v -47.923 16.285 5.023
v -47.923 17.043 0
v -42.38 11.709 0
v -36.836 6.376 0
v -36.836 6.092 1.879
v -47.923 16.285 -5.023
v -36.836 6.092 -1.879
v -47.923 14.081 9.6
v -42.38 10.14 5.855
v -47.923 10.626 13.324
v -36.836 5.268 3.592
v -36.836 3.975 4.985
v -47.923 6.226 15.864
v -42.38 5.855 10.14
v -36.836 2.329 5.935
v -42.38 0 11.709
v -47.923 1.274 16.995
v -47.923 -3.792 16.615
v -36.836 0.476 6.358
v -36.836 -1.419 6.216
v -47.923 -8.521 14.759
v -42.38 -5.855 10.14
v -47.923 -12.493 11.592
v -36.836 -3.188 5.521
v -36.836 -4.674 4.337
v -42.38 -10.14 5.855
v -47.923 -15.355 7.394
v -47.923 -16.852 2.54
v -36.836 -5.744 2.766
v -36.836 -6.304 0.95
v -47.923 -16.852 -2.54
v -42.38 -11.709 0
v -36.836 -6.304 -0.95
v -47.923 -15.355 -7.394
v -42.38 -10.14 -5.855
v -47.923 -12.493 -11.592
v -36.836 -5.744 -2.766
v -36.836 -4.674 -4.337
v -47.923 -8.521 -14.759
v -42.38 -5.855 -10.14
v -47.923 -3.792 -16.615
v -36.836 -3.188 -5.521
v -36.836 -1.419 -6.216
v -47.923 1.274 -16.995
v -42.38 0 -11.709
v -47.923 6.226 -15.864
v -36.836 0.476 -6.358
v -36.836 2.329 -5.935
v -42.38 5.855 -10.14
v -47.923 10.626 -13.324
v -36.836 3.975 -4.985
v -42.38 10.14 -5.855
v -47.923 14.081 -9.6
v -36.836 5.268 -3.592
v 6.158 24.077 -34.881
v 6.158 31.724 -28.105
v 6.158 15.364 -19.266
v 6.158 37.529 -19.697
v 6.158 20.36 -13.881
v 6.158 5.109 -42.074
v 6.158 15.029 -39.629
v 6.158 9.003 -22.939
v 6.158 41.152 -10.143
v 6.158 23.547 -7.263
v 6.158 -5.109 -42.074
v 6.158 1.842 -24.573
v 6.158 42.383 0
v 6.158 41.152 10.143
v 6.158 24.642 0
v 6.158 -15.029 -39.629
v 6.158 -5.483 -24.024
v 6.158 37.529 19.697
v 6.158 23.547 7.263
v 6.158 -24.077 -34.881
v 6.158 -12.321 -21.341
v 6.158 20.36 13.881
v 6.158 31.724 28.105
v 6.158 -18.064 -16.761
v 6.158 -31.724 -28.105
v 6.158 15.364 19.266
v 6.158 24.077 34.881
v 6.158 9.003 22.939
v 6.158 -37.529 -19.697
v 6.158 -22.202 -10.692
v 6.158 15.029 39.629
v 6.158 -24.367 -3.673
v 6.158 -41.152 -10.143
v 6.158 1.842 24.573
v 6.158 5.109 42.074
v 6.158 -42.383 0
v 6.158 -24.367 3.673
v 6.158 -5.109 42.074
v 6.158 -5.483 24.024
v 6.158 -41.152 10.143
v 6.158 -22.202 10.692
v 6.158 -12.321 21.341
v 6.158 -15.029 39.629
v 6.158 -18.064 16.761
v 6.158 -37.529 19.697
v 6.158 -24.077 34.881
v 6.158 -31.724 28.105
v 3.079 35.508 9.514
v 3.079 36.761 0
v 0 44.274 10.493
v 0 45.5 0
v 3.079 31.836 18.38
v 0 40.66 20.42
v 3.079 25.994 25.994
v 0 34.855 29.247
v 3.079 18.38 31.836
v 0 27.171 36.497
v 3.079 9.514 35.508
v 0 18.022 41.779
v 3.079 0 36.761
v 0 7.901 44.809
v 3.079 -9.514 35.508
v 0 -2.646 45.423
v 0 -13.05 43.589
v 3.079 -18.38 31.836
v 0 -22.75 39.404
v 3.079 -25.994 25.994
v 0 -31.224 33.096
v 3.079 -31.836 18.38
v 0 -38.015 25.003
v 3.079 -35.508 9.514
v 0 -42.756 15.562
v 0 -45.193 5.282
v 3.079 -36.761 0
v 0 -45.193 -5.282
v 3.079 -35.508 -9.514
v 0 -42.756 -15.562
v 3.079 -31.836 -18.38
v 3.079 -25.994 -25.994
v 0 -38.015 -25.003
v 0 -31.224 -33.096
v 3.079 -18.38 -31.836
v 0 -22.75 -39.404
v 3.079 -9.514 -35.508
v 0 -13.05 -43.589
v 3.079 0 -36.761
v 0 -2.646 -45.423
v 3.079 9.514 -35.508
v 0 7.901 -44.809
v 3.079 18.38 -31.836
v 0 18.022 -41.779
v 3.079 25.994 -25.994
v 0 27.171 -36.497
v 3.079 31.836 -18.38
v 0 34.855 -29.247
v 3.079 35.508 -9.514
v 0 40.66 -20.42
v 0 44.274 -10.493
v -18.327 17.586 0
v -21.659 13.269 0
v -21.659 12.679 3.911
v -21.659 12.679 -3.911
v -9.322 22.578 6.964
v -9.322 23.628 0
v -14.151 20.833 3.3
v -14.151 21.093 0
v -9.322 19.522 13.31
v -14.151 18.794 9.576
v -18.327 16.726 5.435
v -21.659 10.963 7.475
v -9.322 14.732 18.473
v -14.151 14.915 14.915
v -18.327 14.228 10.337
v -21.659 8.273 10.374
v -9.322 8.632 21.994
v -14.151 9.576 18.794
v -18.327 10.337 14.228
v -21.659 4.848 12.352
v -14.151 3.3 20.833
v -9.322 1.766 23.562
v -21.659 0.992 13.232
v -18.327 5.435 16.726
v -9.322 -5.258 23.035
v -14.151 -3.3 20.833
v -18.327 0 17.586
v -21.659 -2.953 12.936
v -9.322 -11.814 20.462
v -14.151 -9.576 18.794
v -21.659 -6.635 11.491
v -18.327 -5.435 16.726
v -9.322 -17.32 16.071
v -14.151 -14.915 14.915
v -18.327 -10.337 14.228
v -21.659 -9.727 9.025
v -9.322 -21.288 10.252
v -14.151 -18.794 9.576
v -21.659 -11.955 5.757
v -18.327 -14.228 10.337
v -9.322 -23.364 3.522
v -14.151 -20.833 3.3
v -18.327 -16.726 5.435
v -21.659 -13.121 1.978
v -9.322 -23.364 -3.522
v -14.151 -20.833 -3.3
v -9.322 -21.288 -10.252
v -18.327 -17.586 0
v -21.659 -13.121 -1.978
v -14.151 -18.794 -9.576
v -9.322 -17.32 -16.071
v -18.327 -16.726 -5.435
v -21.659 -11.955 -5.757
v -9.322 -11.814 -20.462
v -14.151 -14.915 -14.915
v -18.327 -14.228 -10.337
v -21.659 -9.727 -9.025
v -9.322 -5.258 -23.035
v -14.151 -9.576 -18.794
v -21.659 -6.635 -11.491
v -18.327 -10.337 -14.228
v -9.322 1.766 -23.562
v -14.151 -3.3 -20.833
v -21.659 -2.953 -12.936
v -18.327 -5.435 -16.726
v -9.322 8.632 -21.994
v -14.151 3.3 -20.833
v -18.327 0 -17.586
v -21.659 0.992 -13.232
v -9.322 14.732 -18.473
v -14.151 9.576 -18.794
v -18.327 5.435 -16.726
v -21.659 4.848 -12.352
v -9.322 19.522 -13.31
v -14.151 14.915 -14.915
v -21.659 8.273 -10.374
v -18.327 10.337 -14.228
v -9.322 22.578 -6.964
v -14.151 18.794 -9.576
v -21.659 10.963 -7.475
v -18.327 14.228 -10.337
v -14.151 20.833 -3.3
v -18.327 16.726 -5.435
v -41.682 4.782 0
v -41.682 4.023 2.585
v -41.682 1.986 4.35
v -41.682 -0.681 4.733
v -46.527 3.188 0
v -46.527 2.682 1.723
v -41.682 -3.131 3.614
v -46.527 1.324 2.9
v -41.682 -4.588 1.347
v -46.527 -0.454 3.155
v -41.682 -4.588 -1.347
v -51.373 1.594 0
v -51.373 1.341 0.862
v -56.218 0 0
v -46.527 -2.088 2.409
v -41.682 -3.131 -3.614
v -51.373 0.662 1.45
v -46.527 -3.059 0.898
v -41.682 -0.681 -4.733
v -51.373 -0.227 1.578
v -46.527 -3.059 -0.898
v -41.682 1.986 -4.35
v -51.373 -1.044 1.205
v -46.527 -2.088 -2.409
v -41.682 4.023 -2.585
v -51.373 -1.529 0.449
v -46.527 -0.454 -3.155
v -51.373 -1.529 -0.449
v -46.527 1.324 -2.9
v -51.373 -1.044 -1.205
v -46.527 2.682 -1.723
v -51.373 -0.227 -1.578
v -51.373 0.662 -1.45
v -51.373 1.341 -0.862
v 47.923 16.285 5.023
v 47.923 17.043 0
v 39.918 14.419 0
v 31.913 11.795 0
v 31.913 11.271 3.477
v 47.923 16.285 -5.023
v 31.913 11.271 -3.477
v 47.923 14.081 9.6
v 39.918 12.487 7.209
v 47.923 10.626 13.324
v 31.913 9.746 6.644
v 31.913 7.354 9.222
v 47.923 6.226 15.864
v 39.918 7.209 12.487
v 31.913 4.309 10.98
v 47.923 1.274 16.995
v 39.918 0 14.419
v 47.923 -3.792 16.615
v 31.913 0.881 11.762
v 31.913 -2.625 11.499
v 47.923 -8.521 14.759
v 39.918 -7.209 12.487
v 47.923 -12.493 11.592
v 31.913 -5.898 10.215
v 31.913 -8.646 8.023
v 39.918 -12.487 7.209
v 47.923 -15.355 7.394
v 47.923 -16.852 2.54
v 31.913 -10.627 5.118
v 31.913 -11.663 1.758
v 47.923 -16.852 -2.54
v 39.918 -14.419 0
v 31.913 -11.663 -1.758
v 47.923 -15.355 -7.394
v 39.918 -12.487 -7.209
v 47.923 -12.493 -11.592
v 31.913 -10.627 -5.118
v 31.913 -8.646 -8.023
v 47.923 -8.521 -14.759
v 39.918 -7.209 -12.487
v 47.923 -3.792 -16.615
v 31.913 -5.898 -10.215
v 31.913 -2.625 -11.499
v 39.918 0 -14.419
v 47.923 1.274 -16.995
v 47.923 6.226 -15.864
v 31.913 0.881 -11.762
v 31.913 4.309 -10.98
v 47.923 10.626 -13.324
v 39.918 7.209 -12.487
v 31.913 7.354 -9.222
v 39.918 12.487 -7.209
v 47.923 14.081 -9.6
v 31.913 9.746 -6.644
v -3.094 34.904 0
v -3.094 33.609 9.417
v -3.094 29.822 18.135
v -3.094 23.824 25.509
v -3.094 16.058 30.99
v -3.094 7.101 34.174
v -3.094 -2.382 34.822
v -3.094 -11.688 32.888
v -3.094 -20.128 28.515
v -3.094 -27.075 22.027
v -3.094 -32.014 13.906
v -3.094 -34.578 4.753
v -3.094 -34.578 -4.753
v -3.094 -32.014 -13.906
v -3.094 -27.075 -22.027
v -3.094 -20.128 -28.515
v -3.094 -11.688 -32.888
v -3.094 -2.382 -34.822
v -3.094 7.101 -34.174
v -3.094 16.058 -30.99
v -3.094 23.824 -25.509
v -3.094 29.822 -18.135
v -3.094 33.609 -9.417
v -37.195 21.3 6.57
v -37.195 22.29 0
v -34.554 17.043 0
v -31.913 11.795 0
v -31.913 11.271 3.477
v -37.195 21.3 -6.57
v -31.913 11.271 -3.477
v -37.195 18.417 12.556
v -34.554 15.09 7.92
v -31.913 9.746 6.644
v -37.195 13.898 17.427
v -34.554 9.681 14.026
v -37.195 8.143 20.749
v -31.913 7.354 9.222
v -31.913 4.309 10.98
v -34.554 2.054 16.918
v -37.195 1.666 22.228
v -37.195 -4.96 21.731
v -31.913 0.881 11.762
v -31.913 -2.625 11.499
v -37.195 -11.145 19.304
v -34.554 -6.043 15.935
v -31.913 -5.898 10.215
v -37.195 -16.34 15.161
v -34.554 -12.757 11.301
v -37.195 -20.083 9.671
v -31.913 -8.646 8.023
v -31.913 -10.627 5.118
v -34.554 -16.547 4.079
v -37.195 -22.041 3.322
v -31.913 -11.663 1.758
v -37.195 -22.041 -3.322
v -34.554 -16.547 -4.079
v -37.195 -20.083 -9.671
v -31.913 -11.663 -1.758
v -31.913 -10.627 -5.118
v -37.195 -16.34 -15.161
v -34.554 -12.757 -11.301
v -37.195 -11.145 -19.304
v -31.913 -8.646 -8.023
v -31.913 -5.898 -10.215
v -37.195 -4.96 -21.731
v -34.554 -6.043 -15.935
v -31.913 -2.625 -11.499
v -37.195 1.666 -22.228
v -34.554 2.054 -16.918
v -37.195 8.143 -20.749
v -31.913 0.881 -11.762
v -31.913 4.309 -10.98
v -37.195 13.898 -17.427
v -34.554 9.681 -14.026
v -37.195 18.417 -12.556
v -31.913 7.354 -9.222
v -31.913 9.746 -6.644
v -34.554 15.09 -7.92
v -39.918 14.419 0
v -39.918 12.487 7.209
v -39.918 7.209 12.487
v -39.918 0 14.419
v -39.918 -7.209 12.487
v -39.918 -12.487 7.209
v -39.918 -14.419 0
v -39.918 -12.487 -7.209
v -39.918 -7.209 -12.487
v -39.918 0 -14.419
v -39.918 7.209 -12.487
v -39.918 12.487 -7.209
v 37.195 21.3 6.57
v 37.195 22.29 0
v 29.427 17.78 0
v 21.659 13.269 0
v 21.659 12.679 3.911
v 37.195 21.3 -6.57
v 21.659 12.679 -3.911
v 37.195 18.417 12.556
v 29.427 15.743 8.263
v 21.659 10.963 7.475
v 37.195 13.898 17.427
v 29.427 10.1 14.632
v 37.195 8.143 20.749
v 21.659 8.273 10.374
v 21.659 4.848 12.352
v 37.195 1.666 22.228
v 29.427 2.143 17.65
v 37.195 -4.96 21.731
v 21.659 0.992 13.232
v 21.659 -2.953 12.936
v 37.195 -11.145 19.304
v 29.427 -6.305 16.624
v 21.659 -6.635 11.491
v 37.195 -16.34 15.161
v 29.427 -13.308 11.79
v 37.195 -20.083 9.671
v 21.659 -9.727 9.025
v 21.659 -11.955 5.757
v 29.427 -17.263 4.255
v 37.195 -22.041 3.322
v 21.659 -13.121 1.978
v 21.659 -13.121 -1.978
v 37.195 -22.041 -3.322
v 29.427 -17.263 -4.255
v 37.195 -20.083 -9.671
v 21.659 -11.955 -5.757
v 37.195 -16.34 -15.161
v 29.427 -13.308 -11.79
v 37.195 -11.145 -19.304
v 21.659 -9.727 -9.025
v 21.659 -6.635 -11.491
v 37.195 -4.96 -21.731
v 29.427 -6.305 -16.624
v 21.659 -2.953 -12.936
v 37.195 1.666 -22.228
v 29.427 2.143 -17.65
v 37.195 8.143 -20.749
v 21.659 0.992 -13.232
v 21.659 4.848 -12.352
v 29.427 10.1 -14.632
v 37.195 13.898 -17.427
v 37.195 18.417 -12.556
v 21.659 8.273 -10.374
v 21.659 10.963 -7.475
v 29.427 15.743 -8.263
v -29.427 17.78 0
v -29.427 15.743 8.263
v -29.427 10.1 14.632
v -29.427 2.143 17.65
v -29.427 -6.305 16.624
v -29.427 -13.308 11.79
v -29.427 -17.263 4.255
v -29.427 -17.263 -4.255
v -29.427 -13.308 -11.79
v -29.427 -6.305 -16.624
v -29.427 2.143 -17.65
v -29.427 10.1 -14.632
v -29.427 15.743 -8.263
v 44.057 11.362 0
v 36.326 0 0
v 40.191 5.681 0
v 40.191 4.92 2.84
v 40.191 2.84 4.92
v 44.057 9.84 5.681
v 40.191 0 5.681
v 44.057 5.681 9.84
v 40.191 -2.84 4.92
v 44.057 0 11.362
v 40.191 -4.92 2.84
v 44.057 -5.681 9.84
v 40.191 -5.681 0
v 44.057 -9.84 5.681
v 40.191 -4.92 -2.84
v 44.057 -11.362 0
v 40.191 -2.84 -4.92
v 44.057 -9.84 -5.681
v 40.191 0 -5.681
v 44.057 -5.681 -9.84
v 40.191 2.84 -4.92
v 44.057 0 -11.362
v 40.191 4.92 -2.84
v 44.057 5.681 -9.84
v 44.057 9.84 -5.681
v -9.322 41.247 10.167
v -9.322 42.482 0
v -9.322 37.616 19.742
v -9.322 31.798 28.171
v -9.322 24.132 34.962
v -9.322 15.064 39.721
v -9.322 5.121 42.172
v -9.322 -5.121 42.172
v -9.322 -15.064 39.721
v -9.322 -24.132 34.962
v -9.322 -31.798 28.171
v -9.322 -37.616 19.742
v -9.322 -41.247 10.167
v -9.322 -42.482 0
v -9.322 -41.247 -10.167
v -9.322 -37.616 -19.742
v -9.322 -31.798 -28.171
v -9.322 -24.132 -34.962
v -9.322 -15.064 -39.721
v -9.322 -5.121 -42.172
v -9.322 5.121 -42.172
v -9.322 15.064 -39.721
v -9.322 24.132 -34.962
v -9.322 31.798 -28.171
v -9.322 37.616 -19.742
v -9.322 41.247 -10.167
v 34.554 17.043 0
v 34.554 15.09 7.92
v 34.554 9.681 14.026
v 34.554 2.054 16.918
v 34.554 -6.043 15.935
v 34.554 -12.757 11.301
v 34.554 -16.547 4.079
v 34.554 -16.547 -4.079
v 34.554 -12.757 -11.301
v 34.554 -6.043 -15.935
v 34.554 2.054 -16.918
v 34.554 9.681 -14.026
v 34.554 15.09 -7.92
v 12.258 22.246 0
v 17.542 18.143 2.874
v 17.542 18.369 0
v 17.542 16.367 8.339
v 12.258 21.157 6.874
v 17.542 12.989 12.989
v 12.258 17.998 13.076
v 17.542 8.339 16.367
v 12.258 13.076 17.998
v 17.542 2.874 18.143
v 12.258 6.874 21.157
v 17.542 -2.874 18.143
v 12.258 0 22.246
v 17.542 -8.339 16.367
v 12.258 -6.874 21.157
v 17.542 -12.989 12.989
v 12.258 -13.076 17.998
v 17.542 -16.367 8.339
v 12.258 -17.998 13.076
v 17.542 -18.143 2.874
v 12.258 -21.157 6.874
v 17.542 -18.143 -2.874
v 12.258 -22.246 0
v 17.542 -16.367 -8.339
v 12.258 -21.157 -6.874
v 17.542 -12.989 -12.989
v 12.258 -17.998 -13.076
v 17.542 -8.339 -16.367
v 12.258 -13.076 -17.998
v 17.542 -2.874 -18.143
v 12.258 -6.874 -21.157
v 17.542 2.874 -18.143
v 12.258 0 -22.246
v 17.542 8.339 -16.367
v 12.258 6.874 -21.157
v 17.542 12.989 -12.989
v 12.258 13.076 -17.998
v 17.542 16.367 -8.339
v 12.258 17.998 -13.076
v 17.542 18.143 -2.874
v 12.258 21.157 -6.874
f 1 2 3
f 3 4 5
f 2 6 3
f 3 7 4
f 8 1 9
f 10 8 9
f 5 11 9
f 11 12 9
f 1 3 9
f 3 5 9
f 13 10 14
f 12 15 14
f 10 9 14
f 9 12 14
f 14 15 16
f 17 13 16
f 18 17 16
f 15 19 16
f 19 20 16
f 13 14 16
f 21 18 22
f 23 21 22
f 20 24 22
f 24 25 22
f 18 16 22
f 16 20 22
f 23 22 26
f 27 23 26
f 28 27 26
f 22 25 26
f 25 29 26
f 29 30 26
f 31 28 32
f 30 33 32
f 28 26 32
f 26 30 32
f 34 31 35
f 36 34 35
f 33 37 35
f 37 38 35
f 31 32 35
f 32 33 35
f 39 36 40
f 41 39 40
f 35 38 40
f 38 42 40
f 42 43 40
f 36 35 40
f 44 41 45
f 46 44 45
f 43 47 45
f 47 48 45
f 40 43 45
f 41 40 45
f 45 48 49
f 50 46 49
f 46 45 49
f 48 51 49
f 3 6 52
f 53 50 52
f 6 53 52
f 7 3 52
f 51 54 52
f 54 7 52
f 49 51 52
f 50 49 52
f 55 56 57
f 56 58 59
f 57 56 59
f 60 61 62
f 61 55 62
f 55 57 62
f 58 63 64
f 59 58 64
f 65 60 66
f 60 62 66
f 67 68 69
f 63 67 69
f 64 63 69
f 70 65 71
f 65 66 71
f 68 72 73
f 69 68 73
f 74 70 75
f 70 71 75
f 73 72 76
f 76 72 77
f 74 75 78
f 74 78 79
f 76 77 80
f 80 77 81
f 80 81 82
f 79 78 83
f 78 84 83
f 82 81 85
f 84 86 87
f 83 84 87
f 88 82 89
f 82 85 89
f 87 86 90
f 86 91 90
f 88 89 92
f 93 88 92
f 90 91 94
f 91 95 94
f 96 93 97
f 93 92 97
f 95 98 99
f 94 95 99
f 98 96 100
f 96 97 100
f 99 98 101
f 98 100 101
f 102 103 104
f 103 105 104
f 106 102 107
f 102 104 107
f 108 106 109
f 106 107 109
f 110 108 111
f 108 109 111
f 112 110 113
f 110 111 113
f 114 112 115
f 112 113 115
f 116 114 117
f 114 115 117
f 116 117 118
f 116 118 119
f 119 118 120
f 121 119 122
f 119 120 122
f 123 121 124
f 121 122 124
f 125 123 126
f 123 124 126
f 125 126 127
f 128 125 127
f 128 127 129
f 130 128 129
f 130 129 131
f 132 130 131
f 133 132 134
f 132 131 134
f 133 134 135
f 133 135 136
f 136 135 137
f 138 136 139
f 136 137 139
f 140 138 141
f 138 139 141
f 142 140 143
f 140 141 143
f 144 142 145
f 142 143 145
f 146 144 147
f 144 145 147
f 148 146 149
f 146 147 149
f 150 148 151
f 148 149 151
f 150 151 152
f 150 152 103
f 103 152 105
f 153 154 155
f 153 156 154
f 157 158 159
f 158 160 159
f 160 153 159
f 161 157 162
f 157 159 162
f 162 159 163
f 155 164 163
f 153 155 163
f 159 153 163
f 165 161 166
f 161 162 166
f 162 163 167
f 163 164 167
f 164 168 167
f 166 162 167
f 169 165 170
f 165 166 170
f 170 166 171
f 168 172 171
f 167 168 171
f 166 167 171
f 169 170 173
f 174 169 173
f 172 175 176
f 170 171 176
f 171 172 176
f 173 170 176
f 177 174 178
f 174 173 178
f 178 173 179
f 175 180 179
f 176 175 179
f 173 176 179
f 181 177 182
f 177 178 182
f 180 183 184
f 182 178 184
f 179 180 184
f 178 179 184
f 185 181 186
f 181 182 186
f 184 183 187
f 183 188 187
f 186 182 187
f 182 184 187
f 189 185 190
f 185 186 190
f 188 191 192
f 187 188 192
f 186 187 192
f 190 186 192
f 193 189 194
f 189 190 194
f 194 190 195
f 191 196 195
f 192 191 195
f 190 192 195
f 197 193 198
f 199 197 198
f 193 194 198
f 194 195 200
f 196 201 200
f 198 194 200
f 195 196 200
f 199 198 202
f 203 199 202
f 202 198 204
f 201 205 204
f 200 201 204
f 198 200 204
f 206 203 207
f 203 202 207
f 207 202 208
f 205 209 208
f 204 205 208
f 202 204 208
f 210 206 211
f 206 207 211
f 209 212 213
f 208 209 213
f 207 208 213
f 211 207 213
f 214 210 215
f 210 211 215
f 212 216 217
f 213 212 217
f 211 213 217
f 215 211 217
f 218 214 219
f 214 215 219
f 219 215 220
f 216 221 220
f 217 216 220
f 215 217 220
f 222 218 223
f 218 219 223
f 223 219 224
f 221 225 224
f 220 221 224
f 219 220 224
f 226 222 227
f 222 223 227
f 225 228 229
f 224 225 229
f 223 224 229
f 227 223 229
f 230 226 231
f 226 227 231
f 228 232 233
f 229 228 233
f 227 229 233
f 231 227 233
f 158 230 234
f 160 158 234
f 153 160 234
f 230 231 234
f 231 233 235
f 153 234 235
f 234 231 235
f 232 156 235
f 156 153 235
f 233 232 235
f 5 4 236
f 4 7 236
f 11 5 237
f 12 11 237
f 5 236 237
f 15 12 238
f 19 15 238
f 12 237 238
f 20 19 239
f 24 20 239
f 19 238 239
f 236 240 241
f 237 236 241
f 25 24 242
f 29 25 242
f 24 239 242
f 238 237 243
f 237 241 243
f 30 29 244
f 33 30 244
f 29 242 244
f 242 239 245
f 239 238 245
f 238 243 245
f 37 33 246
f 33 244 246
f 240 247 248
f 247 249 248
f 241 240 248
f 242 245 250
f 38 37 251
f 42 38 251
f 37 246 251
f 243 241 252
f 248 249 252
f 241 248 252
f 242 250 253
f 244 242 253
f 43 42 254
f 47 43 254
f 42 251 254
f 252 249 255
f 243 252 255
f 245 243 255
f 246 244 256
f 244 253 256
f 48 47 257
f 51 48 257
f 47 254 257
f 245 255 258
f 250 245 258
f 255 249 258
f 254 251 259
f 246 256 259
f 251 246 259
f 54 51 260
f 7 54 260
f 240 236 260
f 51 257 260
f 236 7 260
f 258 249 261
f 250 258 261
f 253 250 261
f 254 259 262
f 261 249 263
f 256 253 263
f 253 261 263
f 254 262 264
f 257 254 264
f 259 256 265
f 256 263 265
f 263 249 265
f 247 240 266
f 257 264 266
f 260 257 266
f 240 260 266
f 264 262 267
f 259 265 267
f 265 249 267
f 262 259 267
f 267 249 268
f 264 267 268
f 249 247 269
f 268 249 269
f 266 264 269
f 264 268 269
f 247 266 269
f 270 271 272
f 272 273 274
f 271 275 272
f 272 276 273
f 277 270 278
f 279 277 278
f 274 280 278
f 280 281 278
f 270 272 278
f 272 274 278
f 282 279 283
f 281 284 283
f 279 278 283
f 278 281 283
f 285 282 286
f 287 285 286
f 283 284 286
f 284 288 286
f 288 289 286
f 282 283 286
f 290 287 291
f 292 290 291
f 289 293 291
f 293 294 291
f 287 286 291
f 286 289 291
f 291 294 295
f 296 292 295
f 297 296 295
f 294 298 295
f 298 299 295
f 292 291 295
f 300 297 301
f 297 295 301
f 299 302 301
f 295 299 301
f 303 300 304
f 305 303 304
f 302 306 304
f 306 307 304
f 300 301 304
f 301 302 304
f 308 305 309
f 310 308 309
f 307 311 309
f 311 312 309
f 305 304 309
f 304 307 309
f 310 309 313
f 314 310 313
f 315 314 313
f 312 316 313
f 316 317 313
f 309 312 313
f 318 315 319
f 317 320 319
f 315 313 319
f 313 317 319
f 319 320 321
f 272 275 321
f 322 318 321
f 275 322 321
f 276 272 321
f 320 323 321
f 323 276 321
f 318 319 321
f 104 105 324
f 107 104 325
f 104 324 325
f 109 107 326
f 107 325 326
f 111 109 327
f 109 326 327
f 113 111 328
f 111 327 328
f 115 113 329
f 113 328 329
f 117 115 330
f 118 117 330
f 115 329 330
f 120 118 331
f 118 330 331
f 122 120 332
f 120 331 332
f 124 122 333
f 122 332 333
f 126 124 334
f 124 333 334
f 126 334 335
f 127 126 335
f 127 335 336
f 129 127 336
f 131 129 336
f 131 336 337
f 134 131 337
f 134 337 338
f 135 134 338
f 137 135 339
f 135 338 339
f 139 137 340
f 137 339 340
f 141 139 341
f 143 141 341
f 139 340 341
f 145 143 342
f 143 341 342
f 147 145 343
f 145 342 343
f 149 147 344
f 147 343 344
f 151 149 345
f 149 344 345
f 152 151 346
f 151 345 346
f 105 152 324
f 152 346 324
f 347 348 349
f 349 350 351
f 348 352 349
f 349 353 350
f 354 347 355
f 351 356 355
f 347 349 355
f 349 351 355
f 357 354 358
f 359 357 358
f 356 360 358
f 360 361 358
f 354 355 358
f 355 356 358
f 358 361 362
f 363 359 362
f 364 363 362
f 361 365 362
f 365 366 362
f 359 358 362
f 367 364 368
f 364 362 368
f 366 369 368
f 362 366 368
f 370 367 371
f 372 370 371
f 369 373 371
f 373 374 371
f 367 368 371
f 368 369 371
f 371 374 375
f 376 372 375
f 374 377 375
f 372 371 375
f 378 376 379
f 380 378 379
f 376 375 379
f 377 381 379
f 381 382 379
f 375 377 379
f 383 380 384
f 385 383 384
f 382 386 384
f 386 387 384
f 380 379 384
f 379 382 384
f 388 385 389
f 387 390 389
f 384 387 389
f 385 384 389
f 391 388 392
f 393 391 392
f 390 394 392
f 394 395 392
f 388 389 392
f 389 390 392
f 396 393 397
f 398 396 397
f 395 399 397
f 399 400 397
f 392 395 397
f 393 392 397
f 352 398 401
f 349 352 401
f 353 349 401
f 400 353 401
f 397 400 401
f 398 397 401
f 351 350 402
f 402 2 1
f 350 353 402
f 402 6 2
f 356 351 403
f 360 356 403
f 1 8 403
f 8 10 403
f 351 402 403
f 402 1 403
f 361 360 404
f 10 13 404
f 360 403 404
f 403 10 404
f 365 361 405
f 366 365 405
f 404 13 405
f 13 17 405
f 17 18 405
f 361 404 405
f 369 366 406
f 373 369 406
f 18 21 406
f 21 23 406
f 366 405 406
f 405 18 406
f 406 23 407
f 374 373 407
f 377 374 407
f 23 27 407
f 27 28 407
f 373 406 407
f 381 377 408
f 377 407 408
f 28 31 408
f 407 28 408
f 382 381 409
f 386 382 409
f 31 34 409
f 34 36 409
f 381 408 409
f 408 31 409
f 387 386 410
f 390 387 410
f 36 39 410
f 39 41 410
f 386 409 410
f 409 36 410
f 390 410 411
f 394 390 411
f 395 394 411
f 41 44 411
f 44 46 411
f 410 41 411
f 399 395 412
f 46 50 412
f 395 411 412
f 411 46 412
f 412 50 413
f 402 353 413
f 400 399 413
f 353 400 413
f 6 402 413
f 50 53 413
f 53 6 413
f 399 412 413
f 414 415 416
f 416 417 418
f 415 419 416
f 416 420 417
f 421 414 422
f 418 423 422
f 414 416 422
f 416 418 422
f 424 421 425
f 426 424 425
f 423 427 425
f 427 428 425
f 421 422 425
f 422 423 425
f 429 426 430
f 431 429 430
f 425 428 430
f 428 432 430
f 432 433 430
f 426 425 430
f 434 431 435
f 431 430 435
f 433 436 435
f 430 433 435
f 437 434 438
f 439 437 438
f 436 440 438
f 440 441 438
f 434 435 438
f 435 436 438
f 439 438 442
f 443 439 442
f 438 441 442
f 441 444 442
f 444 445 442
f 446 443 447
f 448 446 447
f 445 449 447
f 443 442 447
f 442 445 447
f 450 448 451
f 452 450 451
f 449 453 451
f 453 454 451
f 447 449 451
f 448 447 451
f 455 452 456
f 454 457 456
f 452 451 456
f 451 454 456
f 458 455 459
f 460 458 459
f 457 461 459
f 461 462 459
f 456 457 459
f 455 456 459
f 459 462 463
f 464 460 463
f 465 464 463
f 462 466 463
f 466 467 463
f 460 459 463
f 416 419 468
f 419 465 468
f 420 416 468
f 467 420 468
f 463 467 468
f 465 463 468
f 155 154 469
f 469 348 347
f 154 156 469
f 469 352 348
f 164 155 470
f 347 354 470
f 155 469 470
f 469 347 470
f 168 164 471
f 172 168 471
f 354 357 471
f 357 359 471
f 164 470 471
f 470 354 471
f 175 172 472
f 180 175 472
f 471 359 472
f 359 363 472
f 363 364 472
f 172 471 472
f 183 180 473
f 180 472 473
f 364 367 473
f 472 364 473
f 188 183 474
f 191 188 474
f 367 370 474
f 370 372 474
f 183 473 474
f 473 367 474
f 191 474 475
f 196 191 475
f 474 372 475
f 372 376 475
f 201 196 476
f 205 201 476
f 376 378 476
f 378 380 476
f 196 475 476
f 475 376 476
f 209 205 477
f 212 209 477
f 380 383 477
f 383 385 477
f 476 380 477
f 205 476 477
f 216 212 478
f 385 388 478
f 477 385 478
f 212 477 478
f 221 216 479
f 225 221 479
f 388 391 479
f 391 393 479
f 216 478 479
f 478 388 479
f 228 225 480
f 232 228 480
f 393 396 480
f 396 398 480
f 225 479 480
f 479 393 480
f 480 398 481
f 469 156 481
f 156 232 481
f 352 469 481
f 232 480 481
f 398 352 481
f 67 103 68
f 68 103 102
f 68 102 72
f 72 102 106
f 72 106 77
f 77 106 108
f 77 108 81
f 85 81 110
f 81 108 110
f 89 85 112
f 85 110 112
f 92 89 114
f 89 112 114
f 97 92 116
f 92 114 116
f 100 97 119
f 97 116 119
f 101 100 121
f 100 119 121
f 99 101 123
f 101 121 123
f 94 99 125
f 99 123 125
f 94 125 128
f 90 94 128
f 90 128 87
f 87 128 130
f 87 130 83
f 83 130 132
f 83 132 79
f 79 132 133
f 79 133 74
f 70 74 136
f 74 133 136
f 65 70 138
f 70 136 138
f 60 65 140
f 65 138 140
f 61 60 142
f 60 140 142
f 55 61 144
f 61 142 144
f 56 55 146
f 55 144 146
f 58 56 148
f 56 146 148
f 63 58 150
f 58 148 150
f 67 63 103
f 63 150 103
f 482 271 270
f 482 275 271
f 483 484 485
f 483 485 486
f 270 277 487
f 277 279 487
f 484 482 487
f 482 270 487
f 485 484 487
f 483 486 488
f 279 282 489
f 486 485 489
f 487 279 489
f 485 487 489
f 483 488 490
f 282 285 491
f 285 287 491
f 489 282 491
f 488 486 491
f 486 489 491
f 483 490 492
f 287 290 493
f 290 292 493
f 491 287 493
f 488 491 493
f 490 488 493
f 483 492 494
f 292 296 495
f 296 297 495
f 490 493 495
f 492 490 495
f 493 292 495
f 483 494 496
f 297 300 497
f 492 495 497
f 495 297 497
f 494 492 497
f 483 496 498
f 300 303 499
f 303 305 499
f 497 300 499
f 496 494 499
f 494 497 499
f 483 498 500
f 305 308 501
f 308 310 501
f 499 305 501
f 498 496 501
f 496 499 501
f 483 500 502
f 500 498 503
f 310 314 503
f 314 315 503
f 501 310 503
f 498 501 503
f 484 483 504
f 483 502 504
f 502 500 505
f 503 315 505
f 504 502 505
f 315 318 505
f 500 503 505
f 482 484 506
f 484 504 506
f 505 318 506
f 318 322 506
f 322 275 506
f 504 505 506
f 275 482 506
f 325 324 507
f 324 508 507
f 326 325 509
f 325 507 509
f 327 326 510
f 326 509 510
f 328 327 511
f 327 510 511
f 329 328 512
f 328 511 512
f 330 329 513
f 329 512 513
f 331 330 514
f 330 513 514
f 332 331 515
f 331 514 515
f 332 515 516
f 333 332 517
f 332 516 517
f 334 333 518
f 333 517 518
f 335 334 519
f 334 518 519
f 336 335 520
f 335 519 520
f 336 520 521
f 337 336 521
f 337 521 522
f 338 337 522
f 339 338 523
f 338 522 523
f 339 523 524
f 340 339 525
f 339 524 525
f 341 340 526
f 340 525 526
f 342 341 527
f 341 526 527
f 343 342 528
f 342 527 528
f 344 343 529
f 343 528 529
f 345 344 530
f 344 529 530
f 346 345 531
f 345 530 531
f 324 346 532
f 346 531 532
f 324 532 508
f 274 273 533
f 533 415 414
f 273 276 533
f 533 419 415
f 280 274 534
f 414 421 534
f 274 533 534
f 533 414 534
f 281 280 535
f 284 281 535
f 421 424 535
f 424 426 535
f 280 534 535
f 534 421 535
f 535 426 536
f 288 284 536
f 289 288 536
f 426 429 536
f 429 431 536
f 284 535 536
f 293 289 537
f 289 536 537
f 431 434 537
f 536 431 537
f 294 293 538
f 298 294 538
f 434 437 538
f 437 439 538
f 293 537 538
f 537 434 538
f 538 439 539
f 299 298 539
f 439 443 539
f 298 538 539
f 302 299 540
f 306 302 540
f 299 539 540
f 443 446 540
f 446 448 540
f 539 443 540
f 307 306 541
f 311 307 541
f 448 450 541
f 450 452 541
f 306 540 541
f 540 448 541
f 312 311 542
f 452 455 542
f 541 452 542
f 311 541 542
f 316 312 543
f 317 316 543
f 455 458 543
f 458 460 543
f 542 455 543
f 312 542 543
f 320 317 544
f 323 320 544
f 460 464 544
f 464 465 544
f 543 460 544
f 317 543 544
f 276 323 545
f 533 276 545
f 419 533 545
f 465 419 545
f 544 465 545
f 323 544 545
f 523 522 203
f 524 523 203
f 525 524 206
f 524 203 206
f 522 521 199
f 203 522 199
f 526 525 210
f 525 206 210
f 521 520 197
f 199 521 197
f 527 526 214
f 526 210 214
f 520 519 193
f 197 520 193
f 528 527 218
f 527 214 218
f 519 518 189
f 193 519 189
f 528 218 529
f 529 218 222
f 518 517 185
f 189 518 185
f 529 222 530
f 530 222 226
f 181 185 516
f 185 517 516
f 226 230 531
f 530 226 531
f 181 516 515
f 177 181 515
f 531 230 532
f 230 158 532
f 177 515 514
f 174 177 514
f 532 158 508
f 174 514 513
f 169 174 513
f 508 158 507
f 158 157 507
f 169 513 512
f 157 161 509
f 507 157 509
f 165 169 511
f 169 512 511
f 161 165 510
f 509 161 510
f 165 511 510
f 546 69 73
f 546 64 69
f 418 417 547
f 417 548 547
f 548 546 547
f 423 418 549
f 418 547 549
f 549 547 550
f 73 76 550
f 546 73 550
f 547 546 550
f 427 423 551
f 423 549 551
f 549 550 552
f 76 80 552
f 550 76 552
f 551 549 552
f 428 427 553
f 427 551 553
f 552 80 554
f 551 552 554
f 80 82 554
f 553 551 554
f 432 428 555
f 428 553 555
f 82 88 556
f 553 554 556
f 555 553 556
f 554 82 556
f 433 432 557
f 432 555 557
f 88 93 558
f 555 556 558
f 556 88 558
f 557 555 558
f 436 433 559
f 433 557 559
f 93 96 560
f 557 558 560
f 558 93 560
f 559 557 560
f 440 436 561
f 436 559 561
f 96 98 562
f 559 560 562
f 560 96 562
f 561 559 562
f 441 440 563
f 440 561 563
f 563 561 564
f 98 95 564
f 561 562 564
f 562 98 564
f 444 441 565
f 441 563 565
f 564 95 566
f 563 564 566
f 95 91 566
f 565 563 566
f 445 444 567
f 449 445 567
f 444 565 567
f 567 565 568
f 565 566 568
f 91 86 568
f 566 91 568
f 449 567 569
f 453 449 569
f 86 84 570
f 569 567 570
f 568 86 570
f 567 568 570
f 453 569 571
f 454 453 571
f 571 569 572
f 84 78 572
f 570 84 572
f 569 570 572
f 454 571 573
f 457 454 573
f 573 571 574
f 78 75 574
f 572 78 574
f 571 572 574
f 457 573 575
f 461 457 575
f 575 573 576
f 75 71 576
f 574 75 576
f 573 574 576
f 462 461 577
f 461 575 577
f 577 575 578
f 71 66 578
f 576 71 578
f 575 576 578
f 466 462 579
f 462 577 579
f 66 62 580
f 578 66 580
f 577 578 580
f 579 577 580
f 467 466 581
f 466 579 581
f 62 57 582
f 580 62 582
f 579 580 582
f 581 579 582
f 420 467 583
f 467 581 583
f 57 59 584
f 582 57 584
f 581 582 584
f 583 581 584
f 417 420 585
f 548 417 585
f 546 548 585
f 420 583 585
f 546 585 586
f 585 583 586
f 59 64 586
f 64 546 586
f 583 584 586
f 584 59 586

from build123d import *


# Not quite as in the source:
# - a feature names something its author has since deleted; it is built from what else it names


with BuildPart() as f1:
    # F0 (on Top) → F1 (revolve)
    with BuildSketch(Plane.XY):
        with BuildLine():
            Line((37.1953770518, 22.2900286317), (21.6585689027, 13.2690012092))
            ThreePointArc((21.6585689027, 13.2690012092), (15.0259859449, 20.4787633021), (6.1581879854, 24.6421736204))
            Line((6.1581879854, 24.6421736204), (6.1581879854, 42.3834808171))
            Line((6.1581879854, 42.3834808171), (3.0790939927, 36.7608899251))
            Line((3.0790939927, 36.7608899251), (0, 45.5001890659))
            Line((0, 45.5001890659), (-3.0941891787, 34.9035797321))
            Line((-3.0941891787, 34.9035797321), (-9.3218332717, 42.48192312))
            Line((-9.3218332717, 42.48192312), (-9.3218332717, 23.6275987873))
            ThreePointArc((-9.3218332717, 23.6275987873), (-16.3331401043, 19.4522115538), (-21.6585689027, 13.2690012092))
            Line((-21.6585689027, 13.2690012092), (-37.1953770518, 22.2900286317))
            Line((-37.1953770518, 22.2900286317), (-31.91267699, 11.7950700223))
            Line((-31.91267699, 11.7950700223), (-47.922976315, 17.042549327))
            Line((-47.922976315, 17.042549327), (-36.8364676833, 6.3755996525))
            Line((-36.8364676833, 6.3755996525), (-56.2179237604, 0))
            Line((-56.2179237604, 0), (36.3256136068, 0))
            Line((36.3256136068, 0), (47.922976315, 17.042549327))
            Line((47.922976315, 17.042549327), (31.91267699, 11.7950700223))
            Line((31.91267699, 11.7950700223), (37.1953770518, 22.2900286317))
        make_face()
    revolve(axis=Axis((-9.9461550768, 0, 0), (1, 0, 0)))


solid = f1.part
